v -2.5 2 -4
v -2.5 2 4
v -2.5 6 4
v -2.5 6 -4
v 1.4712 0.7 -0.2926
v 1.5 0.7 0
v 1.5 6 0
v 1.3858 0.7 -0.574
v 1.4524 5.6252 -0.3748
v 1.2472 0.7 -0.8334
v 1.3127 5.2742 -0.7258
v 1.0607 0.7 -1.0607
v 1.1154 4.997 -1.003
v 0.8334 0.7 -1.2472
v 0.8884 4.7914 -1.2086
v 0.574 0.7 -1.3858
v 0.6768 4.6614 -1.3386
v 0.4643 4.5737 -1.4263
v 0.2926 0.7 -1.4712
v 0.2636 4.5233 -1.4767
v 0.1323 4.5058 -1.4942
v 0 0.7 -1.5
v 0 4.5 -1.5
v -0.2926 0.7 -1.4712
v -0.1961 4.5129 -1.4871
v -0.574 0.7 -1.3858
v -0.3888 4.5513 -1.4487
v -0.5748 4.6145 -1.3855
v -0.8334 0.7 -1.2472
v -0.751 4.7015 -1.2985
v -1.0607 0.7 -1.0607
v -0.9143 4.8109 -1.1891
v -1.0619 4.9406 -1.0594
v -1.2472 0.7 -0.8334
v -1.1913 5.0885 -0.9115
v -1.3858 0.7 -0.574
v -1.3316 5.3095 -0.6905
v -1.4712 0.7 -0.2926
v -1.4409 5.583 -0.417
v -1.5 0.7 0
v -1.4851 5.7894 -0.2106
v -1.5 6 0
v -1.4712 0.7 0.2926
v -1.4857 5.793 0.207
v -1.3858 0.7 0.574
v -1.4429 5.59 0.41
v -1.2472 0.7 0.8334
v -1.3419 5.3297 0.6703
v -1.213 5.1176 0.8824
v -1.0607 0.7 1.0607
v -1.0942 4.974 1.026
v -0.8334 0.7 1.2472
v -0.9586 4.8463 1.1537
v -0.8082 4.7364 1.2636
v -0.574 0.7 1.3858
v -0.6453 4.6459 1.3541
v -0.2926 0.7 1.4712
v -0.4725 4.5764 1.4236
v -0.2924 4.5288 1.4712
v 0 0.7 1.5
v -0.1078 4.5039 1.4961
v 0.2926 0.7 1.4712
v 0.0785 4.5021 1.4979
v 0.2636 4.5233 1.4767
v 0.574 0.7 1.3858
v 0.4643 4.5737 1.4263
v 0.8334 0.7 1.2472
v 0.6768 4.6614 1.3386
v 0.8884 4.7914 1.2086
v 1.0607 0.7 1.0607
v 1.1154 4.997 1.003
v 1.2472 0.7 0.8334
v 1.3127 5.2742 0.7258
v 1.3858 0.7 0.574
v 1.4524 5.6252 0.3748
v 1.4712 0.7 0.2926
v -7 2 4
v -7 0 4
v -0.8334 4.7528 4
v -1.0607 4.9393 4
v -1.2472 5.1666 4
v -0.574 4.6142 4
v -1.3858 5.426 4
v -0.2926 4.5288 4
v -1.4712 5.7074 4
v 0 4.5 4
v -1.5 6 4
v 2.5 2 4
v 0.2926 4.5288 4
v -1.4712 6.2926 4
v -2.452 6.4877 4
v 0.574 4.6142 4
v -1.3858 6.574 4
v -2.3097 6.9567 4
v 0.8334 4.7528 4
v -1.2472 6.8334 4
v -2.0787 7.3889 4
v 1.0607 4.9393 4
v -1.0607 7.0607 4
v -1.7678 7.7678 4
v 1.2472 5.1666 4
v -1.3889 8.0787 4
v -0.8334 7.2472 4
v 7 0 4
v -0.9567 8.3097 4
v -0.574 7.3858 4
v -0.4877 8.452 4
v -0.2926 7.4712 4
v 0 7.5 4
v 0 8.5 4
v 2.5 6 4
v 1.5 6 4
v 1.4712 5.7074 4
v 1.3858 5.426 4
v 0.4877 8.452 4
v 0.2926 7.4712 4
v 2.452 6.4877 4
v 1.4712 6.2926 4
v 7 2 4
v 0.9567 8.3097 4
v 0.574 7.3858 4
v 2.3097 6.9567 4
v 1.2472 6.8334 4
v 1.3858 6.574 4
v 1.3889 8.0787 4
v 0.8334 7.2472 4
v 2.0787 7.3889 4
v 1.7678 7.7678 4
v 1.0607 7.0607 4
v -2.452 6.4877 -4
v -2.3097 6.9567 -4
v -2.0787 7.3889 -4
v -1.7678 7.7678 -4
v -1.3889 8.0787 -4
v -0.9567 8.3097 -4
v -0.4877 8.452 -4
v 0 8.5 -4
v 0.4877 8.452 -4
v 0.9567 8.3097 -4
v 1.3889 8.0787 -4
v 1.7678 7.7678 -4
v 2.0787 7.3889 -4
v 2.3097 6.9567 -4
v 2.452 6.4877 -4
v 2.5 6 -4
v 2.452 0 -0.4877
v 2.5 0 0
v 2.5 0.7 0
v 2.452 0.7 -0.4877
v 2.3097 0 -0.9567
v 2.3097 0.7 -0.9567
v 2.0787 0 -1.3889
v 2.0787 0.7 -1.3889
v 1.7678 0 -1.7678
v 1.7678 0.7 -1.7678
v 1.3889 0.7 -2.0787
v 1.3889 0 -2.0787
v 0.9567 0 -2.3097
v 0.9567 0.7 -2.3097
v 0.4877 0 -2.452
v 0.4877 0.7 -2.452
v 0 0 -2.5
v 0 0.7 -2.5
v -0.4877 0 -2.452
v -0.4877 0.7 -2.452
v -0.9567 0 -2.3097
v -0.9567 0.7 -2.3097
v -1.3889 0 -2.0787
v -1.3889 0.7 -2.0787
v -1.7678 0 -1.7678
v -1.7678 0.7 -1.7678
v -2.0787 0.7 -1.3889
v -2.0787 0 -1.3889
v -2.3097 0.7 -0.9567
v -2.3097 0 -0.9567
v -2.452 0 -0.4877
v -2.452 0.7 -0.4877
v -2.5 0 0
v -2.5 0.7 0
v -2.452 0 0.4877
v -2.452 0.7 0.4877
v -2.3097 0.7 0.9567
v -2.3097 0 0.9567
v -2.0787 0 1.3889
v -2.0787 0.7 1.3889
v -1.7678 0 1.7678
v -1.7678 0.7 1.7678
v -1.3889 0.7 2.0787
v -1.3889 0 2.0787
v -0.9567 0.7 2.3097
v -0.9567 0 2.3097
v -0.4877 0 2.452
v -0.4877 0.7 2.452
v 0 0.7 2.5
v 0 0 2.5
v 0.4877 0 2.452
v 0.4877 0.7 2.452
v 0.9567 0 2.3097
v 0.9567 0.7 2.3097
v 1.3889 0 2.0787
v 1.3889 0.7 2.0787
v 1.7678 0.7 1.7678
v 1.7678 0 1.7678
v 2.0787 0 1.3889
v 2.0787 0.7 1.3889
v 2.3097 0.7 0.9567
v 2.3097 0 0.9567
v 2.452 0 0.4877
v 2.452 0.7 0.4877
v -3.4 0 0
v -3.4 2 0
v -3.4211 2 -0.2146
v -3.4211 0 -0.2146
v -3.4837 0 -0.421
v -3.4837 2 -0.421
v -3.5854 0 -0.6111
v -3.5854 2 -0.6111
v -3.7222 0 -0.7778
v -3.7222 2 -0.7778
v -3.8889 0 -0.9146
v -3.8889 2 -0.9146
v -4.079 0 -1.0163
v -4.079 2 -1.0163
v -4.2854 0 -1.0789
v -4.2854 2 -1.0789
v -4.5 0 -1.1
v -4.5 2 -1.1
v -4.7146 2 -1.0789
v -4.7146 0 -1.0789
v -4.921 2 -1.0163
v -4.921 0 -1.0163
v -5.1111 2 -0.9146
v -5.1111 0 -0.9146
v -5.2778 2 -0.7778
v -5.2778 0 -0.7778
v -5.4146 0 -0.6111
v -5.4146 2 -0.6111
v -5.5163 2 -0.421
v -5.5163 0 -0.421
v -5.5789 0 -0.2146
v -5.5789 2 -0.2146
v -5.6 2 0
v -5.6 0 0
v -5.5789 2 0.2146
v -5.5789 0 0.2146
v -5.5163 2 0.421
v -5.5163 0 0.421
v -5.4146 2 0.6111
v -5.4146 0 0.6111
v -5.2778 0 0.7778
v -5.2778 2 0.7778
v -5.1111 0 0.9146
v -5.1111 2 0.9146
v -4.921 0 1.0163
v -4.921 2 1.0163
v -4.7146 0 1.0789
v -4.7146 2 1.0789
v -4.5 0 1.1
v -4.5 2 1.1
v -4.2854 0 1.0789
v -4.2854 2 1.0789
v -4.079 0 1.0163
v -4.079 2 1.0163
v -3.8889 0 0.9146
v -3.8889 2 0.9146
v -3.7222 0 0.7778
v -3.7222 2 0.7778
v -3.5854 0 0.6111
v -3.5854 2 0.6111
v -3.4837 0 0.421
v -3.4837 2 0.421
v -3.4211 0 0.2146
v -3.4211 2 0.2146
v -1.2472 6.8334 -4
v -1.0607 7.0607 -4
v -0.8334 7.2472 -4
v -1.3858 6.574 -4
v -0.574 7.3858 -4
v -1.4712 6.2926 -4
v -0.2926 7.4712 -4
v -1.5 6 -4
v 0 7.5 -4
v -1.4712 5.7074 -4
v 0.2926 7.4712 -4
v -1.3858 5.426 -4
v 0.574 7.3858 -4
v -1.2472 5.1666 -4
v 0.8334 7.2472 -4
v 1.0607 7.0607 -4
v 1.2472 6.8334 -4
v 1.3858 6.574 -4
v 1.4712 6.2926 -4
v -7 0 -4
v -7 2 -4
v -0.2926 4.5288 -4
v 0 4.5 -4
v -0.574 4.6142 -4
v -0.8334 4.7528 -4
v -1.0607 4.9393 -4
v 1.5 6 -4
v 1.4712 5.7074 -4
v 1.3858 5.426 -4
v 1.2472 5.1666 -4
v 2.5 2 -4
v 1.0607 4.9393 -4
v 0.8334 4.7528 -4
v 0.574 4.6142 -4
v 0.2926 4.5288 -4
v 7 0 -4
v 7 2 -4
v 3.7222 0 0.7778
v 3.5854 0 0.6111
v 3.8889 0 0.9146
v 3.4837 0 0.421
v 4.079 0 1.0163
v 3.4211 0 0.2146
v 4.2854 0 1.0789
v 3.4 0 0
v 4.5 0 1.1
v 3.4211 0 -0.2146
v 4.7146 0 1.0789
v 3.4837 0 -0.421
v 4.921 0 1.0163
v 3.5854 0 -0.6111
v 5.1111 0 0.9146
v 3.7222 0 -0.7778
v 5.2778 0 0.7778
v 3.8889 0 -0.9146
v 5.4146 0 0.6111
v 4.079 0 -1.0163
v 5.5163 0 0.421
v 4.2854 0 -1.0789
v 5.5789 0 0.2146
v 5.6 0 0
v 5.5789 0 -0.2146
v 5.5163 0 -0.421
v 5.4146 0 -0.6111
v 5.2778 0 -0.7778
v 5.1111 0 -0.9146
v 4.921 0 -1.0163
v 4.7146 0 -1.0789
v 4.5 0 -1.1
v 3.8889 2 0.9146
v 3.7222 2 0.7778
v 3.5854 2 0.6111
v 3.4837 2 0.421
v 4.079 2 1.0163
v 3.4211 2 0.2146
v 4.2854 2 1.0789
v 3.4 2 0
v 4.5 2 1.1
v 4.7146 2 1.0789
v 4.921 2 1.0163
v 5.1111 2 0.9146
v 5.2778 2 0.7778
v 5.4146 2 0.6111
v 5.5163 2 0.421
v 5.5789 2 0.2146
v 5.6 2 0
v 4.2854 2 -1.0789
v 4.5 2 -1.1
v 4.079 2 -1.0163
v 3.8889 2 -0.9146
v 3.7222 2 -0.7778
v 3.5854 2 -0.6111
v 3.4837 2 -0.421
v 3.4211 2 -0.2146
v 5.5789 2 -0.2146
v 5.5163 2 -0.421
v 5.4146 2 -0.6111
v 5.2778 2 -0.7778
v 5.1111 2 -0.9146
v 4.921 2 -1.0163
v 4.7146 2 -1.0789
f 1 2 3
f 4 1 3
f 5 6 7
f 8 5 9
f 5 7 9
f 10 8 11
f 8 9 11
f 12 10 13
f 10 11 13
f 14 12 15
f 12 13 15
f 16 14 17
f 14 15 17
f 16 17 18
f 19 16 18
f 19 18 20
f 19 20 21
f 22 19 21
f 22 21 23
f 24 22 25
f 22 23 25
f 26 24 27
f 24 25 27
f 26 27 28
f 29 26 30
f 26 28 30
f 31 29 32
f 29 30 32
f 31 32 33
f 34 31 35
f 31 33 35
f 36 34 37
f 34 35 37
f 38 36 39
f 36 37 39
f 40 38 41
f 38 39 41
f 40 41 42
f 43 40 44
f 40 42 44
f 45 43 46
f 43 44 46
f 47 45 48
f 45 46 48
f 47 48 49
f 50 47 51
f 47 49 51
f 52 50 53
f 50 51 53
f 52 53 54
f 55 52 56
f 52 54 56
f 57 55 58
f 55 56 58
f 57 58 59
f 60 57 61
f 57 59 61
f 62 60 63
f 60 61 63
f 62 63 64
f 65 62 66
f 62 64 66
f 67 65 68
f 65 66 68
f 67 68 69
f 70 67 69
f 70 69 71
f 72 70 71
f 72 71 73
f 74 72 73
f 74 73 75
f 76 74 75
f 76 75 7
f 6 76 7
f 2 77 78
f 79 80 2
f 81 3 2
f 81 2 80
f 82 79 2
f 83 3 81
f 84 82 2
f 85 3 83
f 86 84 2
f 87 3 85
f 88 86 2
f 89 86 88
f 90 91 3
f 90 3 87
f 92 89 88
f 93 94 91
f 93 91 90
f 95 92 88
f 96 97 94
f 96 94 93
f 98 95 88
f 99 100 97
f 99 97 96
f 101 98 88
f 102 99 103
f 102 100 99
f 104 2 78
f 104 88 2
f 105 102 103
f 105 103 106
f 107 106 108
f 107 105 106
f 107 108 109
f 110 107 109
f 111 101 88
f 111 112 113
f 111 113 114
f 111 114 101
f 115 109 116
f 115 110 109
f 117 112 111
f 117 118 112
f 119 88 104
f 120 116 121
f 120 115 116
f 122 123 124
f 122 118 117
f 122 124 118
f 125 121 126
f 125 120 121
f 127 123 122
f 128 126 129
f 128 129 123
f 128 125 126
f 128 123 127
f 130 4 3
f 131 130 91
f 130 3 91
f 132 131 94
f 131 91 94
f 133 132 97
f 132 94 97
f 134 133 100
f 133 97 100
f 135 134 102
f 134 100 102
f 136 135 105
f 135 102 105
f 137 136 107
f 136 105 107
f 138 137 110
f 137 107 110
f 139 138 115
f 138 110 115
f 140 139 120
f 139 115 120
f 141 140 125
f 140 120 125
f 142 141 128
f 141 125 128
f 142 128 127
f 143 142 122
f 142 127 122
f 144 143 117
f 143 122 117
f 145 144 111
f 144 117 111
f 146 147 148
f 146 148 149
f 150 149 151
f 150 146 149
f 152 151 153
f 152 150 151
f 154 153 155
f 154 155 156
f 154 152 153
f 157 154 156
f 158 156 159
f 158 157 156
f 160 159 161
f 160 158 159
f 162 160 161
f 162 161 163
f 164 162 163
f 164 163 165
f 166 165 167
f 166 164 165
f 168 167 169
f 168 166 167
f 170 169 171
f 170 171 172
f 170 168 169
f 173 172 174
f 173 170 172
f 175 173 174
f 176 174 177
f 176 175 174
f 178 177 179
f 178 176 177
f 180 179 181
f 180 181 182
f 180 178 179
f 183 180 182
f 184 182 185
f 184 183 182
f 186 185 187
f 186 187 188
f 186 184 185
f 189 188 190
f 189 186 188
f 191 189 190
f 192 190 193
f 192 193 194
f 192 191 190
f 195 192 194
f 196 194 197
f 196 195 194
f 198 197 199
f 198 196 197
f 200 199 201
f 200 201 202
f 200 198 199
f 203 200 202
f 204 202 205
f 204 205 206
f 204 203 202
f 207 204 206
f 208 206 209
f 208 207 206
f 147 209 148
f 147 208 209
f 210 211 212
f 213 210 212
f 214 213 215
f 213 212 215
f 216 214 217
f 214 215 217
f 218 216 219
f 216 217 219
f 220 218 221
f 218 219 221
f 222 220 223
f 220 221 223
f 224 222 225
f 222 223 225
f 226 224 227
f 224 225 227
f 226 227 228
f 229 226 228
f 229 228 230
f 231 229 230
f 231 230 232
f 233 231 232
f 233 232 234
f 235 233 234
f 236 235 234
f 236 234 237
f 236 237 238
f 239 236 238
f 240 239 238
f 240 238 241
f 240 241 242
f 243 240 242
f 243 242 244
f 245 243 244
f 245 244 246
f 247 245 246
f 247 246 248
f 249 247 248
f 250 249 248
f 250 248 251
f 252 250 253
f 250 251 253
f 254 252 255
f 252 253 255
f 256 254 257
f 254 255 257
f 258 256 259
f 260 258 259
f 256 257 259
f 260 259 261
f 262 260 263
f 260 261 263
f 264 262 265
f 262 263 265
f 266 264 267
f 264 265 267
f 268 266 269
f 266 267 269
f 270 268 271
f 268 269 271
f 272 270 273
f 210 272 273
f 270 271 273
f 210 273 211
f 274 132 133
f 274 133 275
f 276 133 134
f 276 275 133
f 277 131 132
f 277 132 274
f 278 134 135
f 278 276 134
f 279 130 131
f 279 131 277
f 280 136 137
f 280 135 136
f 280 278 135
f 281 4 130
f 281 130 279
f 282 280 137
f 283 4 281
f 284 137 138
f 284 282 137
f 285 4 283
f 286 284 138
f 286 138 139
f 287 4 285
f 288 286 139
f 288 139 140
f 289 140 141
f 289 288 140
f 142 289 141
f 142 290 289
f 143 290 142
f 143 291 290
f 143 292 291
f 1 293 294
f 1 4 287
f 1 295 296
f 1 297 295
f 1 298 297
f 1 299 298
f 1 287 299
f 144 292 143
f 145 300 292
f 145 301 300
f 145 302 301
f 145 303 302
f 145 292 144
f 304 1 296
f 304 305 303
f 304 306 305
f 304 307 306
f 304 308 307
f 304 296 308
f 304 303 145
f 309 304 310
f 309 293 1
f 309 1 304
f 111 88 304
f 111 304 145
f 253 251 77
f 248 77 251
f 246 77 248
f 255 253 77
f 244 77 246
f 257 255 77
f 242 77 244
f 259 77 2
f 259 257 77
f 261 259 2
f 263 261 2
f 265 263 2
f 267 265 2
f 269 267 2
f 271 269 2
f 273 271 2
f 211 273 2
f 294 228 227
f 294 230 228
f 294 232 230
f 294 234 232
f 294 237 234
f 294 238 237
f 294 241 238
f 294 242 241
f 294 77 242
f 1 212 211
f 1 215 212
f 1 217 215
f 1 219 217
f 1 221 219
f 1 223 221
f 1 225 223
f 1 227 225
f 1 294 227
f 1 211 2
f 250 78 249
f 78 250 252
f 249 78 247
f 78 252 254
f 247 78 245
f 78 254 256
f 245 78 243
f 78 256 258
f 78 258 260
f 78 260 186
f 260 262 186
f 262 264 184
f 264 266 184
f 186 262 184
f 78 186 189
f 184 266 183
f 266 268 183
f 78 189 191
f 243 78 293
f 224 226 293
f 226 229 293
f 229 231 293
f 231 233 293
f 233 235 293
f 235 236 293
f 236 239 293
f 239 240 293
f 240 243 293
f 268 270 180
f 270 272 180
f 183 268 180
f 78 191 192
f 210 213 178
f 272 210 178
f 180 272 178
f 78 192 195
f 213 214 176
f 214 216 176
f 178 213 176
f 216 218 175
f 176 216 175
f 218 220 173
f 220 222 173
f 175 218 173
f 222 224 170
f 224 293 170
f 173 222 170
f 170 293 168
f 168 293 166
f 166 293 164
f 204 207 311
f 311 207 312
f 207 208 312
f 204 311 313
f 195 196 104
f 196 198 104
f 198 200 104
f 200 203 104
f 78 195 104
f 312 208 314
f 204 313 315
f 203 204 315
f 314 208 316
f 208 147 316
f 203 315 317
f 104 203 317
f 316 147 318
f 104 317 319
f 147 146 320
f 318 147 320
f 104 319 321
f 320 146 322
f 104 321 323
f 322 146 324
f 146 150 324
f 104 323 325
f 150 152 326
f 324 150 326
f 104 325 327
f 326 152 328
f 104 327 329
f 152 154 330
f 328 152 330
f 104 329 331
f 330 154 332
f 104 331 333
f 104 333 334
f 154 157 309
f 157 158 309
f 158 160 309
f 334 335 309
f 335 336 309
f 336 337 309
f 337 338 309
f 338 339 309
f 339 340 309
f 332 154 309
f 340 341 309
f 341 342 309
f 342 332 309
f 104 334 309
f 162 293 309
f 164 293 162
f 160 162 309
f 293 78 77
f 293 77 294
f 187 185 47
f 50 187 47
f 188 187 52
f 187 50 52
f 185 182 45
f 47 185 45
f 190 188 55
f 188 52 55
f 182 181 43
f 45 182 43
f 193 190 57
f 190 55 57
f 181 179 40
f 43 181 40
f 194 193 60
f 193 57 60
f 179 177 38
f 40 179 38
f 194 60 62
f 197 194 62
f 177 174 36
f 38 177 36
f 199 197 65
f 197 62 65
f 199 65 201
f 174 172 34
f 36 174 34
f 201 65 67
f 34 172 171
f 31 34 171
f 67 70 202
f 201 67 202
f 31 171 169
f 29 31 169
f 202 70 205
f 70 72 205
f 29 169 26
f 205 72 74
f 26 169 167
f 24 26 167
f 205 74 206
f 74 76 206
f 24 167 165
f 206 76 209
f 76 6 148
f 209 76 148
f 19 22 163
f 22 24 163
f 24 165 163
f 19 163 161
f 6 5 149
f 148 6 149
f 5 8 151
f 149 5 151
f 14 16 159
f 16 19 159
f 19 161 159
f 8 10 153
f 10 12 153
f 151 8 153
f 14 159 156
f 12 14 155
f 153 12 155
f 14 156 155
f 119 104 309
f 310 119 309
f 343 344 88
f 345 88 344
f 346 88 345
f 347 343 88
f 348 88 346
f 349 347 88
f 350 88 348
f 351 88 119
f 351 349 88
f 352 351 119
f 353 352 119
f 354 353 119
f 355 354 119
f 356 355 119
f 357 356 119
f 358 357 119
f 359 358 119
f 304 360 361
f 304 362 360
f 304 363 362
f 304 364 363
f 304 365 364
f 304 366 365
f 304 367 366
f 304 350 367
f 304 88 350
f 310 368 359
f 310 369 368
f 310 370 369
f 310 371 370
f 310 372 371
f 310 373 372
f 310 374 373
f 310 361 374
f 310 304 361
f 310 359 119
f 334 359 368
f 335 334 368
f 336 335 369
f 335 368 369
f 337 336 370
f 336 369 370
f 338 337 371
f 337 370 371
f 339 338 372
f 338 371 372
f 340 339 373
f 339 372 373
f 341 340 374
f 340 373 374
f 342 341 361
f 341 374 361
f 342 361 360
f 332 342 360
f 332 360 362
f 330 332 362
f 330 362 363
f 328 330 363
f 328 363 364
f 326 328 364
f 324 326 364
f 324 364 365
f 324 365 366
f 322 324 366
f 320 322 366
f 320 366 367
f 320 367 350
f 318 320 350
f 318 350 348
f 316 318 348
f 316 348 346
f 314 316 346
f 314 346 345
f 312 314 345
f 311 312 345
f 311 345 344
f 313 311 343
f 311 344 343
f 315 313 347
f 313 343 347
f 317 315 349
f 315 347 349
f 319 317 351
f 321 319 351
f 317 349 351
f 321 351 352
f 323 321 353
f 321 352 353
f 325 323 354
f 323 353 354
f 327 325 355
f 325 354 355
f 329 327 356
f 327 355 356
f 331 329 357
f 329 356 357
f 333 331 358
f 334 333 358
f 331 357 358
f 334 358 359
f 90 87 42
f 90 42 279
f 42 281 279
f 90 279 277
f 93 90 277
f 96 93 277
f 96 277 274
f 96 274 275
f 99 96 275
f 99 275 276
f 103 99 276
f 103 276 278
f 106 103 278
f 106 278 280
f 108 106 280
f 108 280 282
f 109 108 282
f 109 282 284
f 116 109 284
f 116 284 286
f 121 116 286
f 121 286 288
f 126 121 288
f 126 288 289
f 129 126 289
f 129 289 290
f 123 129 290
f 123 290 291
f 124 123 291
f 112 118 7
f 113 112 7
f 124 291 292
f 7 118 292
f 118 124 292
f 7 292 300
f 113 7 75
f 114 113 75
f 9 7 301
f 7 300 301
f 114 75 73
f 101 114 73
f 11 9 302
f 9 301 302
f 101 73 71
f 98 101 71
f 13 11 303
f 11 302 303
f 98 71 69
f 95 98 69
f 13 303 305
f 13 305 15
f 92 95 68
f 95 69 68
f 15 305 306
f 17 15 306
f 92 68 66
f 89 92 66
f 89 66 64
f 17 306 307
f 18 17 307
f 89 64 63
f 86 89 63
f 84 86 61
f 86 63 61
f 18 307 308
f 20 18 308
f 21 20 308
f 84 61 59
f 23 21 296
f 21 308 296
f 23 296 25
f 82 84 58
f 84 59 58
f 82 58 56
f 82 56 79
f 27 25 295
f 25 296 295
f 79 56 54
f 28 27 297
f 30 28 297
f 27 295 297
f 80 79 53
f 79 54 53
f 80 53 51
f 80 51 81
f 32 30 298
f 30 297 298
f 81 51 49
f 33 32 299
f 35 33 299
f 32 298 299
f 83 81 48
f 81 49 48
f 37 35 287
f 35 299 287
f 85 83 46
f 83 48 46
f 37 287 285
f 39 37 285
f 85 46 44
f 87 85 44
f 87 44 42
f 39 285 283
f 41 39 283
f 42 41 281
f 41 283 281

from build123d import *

# Parameters (mm, degrees)
BASE_SKETCH_W                        = 14
BASE_SKETCH_H                        = 8
BASE_EXTRUDE_DEPTH                   = 2
PROTRUSION_EXTRUDE_REACH             = 6
PROTRUSION_SKETCH_W                  = 5
PROTRUSION_SKETCH_H                  = 4
PROTRUSION_EXTRUDE_DIRECTION_2_REACH = 6
F_3_0_3_DIAMETER_HOLE1_D             = 3
F_2_2_2_2_DIAMETER_HOLE1_D           = 2.2
F_3_0_3_DIAMETER_HOLE2_D             = 3
F_3_0_3_DIAMETER_HOLE2_DEPTH         = 6
F_3_0_3_DIAMETER_HOLE2_TIP           = 0.901290929
F_5MM_CUT_SKETCH_R                   = 2.5
F_5_MM_DIAMETER_CUT_DEPTH            = 0.7


with BuildPart() as part:
    # Base Sketch → Base Extrude (new body)
    with BuildSketch(Plane(origin=(0, 0, 0), x_dir=(1, 0, 0), z_dir=(0, 1, 0))):
        Rectangle(BASE_SKETCH_W, BASE_SKETCH_H)
    extrude(amount=BASE_EXTRUDE_DEPTH)

    # Protrusion Extrude: up to this face of the body (flat: up to its plane)
    protrusion_extrude_end = Plane(part.part.faces().sort_by_distance((0, 1, 4))[0])
    # Protrusion Sketch → Protrusion Extrude (add, up to the picked face)
    with BuildSketch(Plane.XY, mode=Mode.PRIVATE) as protrusion_extrude_sk1:
        with BuildLine():
            ThreePointArc((-2.5, 6), (0, 8.5), (2.5, 6))
            Line((2.5, 6), (-2.5, 6))
        make_face()
    protrusion_extrude_tool1 = split(extrude(protrusion_extrude_sk1.sketch, amount=PROTRUSION_EXTRUDE_REACH, mode=Mode.PRIVATE), bisect_by=protrusion_extrude_end, keep=Keep.BOTH, mode=Mode.PRIVATE)
    add(protrusion_extrude_tool1.solids().sort_by_distance((0, 7.061033, 0))[0])
    # Protrusion Sketch → Protrusion Extrude (add, up to the picked face)
    with BuildSketch(Plane.XY, mode=Mode.PRIVATE) as protrusion_extrude_sk2:
        with Locations((0, 4)):
            Rectangle(PROTRUSION_SKETCH_W, PROTRUSION_SKETCH_H)
    protrusion_extrude_tool2 = split(extrude(protrusion_extrude_sk2.sketch, amount=PROTRUSION_EXTRUDE_REACH, mode=Mode.PRIVATE), bisect_by=protrusion_extrude_end, keep=Keep.BOTH, mode=Mode.PRIVATE)
    add(protrusion_extrude_tool2.solids().sort_by_distance((0, 4, 0))[0])

    # Protrusion Extrude direction 2: up to this face of the body (flat: up to its plane)
    protrusion_extrude_direction_2_end = Plane(part.part.faces().sort_by_distance((0, 1, -4))[0])
    # Protrusion Sketch → Protrusion Extrude direction 2 (add, up to the picked face)
    with BuildSketch(Plane.XY, mode=Mode.PRIVATE) as protrusion_extrude_direction_2_sk1:
        with BuildLine():
            ThreePointArc((-2.5, 6), (0, 8.5), (2.5, 6))
            Line((2.5, 6), (-2.5, 6))
        make_face()
    protrusion_extrude_direction_2_tool1 = split(extrude(protrusion_extrude_direction_2_sk1.sketch, amount=-PROTRUSION_EXTRUDE_DIRECTION_2_REACH, mode=Mode.PRIVATE), bisect_by=protrusion_extrude_direction_2_end, keep=Keep.BOTH, mode=Mode.PRIVATE)
    add(protrusion_extrude_direction_2_tool1.solids().sort_by_distance((0, 7.061033, 0))[0])
    # Protrusion Sketch → Protrusion Extrude direction 2 (add, up to the picked face)
    with BuildSketch(Plane.XY, mode=Mode.PRIVATE) as protrusion_extrude_direction_2_sk2:
        with Locations((0, 4)):
            Rectangle(PROTRUSION_SKETCH_W, PROTRUSION_SKETCH_H)
    protrusion_extrude_direction_2_tool2 = split(extrude(protrusion_extrude_direction_2_sk2.sketch, amount=-PROTRUSION_EXTRUDE_DIRECTION_2_REACH, mode=Mode.PRIVATE), bisect_by=protrusion_extrude_direction_2_end, keep=Keep.BOTH, mode=Mode.PRIVATE)
    add(protrusion_extrude_direction_2_tool2.solids().sort_by_distance((0, 4, 0))[0])

    # Ø3.0 (3) Diameter Hole1 (through all)
    with Locations(Plane.XY.offset(4)):
        with Locations((0, 6)):
            Hole(F_3_0_3_DIAMETER_HOLE1_D / 2)

    # Ø2.2 (2.2) Diameter Hole1 (through all)
    with Locations(Plane(origin=(0, 0, 0), x_dir=(-1, 0, 0), z_dir=(0, -1, 0))):
        with Locations((4.5, 0), (-4.5, 0)):
            Hole(F_2_2_2_2_DIAMETER_HOLE1_D / 2)

    # Ø3.0 (3) Diameter Hole2
    with Locations(Plane(origin=(0, 0, 0), x_dir=(-1, 0, 0), z_dir=(0, -1, 0))):
        with Locations((0, 0)):
            Hole(F_3_0_3_DIAMETER_HOLE2_D / 2, depth=F_3_0_3_DIAMETER_HOLE2_DEPTH)
            with Locations((0, 0, -(F_3_0_3_DIAMETER_HOLE2_DEPTH + F_3_0_3_DIAMETER_HOLE2_TIP / 2))):  # 118° drill point
                Cone(0, F_3_0_3_DIAMETER_HOLE2_D / 2, F_3_0_3_DIAMETER_HOLE2_TIP, mode=Mode.SUBTRACT)

    # 5mm Cut Sketch → 5 mm diameter Cut (cut)
    with BuildSketch(Plane(origin=(0, 0, 0), x_dir=(1, 0, 0), z_dir=(0, 1, 0))):
        Circle(F_5MM_CUT_SKETCH_R)
    extrude(amount=F_5_MM_DIAMETER_CUT_DEPTH, mode=Mode.SUBTRACT)


solid = part.part
